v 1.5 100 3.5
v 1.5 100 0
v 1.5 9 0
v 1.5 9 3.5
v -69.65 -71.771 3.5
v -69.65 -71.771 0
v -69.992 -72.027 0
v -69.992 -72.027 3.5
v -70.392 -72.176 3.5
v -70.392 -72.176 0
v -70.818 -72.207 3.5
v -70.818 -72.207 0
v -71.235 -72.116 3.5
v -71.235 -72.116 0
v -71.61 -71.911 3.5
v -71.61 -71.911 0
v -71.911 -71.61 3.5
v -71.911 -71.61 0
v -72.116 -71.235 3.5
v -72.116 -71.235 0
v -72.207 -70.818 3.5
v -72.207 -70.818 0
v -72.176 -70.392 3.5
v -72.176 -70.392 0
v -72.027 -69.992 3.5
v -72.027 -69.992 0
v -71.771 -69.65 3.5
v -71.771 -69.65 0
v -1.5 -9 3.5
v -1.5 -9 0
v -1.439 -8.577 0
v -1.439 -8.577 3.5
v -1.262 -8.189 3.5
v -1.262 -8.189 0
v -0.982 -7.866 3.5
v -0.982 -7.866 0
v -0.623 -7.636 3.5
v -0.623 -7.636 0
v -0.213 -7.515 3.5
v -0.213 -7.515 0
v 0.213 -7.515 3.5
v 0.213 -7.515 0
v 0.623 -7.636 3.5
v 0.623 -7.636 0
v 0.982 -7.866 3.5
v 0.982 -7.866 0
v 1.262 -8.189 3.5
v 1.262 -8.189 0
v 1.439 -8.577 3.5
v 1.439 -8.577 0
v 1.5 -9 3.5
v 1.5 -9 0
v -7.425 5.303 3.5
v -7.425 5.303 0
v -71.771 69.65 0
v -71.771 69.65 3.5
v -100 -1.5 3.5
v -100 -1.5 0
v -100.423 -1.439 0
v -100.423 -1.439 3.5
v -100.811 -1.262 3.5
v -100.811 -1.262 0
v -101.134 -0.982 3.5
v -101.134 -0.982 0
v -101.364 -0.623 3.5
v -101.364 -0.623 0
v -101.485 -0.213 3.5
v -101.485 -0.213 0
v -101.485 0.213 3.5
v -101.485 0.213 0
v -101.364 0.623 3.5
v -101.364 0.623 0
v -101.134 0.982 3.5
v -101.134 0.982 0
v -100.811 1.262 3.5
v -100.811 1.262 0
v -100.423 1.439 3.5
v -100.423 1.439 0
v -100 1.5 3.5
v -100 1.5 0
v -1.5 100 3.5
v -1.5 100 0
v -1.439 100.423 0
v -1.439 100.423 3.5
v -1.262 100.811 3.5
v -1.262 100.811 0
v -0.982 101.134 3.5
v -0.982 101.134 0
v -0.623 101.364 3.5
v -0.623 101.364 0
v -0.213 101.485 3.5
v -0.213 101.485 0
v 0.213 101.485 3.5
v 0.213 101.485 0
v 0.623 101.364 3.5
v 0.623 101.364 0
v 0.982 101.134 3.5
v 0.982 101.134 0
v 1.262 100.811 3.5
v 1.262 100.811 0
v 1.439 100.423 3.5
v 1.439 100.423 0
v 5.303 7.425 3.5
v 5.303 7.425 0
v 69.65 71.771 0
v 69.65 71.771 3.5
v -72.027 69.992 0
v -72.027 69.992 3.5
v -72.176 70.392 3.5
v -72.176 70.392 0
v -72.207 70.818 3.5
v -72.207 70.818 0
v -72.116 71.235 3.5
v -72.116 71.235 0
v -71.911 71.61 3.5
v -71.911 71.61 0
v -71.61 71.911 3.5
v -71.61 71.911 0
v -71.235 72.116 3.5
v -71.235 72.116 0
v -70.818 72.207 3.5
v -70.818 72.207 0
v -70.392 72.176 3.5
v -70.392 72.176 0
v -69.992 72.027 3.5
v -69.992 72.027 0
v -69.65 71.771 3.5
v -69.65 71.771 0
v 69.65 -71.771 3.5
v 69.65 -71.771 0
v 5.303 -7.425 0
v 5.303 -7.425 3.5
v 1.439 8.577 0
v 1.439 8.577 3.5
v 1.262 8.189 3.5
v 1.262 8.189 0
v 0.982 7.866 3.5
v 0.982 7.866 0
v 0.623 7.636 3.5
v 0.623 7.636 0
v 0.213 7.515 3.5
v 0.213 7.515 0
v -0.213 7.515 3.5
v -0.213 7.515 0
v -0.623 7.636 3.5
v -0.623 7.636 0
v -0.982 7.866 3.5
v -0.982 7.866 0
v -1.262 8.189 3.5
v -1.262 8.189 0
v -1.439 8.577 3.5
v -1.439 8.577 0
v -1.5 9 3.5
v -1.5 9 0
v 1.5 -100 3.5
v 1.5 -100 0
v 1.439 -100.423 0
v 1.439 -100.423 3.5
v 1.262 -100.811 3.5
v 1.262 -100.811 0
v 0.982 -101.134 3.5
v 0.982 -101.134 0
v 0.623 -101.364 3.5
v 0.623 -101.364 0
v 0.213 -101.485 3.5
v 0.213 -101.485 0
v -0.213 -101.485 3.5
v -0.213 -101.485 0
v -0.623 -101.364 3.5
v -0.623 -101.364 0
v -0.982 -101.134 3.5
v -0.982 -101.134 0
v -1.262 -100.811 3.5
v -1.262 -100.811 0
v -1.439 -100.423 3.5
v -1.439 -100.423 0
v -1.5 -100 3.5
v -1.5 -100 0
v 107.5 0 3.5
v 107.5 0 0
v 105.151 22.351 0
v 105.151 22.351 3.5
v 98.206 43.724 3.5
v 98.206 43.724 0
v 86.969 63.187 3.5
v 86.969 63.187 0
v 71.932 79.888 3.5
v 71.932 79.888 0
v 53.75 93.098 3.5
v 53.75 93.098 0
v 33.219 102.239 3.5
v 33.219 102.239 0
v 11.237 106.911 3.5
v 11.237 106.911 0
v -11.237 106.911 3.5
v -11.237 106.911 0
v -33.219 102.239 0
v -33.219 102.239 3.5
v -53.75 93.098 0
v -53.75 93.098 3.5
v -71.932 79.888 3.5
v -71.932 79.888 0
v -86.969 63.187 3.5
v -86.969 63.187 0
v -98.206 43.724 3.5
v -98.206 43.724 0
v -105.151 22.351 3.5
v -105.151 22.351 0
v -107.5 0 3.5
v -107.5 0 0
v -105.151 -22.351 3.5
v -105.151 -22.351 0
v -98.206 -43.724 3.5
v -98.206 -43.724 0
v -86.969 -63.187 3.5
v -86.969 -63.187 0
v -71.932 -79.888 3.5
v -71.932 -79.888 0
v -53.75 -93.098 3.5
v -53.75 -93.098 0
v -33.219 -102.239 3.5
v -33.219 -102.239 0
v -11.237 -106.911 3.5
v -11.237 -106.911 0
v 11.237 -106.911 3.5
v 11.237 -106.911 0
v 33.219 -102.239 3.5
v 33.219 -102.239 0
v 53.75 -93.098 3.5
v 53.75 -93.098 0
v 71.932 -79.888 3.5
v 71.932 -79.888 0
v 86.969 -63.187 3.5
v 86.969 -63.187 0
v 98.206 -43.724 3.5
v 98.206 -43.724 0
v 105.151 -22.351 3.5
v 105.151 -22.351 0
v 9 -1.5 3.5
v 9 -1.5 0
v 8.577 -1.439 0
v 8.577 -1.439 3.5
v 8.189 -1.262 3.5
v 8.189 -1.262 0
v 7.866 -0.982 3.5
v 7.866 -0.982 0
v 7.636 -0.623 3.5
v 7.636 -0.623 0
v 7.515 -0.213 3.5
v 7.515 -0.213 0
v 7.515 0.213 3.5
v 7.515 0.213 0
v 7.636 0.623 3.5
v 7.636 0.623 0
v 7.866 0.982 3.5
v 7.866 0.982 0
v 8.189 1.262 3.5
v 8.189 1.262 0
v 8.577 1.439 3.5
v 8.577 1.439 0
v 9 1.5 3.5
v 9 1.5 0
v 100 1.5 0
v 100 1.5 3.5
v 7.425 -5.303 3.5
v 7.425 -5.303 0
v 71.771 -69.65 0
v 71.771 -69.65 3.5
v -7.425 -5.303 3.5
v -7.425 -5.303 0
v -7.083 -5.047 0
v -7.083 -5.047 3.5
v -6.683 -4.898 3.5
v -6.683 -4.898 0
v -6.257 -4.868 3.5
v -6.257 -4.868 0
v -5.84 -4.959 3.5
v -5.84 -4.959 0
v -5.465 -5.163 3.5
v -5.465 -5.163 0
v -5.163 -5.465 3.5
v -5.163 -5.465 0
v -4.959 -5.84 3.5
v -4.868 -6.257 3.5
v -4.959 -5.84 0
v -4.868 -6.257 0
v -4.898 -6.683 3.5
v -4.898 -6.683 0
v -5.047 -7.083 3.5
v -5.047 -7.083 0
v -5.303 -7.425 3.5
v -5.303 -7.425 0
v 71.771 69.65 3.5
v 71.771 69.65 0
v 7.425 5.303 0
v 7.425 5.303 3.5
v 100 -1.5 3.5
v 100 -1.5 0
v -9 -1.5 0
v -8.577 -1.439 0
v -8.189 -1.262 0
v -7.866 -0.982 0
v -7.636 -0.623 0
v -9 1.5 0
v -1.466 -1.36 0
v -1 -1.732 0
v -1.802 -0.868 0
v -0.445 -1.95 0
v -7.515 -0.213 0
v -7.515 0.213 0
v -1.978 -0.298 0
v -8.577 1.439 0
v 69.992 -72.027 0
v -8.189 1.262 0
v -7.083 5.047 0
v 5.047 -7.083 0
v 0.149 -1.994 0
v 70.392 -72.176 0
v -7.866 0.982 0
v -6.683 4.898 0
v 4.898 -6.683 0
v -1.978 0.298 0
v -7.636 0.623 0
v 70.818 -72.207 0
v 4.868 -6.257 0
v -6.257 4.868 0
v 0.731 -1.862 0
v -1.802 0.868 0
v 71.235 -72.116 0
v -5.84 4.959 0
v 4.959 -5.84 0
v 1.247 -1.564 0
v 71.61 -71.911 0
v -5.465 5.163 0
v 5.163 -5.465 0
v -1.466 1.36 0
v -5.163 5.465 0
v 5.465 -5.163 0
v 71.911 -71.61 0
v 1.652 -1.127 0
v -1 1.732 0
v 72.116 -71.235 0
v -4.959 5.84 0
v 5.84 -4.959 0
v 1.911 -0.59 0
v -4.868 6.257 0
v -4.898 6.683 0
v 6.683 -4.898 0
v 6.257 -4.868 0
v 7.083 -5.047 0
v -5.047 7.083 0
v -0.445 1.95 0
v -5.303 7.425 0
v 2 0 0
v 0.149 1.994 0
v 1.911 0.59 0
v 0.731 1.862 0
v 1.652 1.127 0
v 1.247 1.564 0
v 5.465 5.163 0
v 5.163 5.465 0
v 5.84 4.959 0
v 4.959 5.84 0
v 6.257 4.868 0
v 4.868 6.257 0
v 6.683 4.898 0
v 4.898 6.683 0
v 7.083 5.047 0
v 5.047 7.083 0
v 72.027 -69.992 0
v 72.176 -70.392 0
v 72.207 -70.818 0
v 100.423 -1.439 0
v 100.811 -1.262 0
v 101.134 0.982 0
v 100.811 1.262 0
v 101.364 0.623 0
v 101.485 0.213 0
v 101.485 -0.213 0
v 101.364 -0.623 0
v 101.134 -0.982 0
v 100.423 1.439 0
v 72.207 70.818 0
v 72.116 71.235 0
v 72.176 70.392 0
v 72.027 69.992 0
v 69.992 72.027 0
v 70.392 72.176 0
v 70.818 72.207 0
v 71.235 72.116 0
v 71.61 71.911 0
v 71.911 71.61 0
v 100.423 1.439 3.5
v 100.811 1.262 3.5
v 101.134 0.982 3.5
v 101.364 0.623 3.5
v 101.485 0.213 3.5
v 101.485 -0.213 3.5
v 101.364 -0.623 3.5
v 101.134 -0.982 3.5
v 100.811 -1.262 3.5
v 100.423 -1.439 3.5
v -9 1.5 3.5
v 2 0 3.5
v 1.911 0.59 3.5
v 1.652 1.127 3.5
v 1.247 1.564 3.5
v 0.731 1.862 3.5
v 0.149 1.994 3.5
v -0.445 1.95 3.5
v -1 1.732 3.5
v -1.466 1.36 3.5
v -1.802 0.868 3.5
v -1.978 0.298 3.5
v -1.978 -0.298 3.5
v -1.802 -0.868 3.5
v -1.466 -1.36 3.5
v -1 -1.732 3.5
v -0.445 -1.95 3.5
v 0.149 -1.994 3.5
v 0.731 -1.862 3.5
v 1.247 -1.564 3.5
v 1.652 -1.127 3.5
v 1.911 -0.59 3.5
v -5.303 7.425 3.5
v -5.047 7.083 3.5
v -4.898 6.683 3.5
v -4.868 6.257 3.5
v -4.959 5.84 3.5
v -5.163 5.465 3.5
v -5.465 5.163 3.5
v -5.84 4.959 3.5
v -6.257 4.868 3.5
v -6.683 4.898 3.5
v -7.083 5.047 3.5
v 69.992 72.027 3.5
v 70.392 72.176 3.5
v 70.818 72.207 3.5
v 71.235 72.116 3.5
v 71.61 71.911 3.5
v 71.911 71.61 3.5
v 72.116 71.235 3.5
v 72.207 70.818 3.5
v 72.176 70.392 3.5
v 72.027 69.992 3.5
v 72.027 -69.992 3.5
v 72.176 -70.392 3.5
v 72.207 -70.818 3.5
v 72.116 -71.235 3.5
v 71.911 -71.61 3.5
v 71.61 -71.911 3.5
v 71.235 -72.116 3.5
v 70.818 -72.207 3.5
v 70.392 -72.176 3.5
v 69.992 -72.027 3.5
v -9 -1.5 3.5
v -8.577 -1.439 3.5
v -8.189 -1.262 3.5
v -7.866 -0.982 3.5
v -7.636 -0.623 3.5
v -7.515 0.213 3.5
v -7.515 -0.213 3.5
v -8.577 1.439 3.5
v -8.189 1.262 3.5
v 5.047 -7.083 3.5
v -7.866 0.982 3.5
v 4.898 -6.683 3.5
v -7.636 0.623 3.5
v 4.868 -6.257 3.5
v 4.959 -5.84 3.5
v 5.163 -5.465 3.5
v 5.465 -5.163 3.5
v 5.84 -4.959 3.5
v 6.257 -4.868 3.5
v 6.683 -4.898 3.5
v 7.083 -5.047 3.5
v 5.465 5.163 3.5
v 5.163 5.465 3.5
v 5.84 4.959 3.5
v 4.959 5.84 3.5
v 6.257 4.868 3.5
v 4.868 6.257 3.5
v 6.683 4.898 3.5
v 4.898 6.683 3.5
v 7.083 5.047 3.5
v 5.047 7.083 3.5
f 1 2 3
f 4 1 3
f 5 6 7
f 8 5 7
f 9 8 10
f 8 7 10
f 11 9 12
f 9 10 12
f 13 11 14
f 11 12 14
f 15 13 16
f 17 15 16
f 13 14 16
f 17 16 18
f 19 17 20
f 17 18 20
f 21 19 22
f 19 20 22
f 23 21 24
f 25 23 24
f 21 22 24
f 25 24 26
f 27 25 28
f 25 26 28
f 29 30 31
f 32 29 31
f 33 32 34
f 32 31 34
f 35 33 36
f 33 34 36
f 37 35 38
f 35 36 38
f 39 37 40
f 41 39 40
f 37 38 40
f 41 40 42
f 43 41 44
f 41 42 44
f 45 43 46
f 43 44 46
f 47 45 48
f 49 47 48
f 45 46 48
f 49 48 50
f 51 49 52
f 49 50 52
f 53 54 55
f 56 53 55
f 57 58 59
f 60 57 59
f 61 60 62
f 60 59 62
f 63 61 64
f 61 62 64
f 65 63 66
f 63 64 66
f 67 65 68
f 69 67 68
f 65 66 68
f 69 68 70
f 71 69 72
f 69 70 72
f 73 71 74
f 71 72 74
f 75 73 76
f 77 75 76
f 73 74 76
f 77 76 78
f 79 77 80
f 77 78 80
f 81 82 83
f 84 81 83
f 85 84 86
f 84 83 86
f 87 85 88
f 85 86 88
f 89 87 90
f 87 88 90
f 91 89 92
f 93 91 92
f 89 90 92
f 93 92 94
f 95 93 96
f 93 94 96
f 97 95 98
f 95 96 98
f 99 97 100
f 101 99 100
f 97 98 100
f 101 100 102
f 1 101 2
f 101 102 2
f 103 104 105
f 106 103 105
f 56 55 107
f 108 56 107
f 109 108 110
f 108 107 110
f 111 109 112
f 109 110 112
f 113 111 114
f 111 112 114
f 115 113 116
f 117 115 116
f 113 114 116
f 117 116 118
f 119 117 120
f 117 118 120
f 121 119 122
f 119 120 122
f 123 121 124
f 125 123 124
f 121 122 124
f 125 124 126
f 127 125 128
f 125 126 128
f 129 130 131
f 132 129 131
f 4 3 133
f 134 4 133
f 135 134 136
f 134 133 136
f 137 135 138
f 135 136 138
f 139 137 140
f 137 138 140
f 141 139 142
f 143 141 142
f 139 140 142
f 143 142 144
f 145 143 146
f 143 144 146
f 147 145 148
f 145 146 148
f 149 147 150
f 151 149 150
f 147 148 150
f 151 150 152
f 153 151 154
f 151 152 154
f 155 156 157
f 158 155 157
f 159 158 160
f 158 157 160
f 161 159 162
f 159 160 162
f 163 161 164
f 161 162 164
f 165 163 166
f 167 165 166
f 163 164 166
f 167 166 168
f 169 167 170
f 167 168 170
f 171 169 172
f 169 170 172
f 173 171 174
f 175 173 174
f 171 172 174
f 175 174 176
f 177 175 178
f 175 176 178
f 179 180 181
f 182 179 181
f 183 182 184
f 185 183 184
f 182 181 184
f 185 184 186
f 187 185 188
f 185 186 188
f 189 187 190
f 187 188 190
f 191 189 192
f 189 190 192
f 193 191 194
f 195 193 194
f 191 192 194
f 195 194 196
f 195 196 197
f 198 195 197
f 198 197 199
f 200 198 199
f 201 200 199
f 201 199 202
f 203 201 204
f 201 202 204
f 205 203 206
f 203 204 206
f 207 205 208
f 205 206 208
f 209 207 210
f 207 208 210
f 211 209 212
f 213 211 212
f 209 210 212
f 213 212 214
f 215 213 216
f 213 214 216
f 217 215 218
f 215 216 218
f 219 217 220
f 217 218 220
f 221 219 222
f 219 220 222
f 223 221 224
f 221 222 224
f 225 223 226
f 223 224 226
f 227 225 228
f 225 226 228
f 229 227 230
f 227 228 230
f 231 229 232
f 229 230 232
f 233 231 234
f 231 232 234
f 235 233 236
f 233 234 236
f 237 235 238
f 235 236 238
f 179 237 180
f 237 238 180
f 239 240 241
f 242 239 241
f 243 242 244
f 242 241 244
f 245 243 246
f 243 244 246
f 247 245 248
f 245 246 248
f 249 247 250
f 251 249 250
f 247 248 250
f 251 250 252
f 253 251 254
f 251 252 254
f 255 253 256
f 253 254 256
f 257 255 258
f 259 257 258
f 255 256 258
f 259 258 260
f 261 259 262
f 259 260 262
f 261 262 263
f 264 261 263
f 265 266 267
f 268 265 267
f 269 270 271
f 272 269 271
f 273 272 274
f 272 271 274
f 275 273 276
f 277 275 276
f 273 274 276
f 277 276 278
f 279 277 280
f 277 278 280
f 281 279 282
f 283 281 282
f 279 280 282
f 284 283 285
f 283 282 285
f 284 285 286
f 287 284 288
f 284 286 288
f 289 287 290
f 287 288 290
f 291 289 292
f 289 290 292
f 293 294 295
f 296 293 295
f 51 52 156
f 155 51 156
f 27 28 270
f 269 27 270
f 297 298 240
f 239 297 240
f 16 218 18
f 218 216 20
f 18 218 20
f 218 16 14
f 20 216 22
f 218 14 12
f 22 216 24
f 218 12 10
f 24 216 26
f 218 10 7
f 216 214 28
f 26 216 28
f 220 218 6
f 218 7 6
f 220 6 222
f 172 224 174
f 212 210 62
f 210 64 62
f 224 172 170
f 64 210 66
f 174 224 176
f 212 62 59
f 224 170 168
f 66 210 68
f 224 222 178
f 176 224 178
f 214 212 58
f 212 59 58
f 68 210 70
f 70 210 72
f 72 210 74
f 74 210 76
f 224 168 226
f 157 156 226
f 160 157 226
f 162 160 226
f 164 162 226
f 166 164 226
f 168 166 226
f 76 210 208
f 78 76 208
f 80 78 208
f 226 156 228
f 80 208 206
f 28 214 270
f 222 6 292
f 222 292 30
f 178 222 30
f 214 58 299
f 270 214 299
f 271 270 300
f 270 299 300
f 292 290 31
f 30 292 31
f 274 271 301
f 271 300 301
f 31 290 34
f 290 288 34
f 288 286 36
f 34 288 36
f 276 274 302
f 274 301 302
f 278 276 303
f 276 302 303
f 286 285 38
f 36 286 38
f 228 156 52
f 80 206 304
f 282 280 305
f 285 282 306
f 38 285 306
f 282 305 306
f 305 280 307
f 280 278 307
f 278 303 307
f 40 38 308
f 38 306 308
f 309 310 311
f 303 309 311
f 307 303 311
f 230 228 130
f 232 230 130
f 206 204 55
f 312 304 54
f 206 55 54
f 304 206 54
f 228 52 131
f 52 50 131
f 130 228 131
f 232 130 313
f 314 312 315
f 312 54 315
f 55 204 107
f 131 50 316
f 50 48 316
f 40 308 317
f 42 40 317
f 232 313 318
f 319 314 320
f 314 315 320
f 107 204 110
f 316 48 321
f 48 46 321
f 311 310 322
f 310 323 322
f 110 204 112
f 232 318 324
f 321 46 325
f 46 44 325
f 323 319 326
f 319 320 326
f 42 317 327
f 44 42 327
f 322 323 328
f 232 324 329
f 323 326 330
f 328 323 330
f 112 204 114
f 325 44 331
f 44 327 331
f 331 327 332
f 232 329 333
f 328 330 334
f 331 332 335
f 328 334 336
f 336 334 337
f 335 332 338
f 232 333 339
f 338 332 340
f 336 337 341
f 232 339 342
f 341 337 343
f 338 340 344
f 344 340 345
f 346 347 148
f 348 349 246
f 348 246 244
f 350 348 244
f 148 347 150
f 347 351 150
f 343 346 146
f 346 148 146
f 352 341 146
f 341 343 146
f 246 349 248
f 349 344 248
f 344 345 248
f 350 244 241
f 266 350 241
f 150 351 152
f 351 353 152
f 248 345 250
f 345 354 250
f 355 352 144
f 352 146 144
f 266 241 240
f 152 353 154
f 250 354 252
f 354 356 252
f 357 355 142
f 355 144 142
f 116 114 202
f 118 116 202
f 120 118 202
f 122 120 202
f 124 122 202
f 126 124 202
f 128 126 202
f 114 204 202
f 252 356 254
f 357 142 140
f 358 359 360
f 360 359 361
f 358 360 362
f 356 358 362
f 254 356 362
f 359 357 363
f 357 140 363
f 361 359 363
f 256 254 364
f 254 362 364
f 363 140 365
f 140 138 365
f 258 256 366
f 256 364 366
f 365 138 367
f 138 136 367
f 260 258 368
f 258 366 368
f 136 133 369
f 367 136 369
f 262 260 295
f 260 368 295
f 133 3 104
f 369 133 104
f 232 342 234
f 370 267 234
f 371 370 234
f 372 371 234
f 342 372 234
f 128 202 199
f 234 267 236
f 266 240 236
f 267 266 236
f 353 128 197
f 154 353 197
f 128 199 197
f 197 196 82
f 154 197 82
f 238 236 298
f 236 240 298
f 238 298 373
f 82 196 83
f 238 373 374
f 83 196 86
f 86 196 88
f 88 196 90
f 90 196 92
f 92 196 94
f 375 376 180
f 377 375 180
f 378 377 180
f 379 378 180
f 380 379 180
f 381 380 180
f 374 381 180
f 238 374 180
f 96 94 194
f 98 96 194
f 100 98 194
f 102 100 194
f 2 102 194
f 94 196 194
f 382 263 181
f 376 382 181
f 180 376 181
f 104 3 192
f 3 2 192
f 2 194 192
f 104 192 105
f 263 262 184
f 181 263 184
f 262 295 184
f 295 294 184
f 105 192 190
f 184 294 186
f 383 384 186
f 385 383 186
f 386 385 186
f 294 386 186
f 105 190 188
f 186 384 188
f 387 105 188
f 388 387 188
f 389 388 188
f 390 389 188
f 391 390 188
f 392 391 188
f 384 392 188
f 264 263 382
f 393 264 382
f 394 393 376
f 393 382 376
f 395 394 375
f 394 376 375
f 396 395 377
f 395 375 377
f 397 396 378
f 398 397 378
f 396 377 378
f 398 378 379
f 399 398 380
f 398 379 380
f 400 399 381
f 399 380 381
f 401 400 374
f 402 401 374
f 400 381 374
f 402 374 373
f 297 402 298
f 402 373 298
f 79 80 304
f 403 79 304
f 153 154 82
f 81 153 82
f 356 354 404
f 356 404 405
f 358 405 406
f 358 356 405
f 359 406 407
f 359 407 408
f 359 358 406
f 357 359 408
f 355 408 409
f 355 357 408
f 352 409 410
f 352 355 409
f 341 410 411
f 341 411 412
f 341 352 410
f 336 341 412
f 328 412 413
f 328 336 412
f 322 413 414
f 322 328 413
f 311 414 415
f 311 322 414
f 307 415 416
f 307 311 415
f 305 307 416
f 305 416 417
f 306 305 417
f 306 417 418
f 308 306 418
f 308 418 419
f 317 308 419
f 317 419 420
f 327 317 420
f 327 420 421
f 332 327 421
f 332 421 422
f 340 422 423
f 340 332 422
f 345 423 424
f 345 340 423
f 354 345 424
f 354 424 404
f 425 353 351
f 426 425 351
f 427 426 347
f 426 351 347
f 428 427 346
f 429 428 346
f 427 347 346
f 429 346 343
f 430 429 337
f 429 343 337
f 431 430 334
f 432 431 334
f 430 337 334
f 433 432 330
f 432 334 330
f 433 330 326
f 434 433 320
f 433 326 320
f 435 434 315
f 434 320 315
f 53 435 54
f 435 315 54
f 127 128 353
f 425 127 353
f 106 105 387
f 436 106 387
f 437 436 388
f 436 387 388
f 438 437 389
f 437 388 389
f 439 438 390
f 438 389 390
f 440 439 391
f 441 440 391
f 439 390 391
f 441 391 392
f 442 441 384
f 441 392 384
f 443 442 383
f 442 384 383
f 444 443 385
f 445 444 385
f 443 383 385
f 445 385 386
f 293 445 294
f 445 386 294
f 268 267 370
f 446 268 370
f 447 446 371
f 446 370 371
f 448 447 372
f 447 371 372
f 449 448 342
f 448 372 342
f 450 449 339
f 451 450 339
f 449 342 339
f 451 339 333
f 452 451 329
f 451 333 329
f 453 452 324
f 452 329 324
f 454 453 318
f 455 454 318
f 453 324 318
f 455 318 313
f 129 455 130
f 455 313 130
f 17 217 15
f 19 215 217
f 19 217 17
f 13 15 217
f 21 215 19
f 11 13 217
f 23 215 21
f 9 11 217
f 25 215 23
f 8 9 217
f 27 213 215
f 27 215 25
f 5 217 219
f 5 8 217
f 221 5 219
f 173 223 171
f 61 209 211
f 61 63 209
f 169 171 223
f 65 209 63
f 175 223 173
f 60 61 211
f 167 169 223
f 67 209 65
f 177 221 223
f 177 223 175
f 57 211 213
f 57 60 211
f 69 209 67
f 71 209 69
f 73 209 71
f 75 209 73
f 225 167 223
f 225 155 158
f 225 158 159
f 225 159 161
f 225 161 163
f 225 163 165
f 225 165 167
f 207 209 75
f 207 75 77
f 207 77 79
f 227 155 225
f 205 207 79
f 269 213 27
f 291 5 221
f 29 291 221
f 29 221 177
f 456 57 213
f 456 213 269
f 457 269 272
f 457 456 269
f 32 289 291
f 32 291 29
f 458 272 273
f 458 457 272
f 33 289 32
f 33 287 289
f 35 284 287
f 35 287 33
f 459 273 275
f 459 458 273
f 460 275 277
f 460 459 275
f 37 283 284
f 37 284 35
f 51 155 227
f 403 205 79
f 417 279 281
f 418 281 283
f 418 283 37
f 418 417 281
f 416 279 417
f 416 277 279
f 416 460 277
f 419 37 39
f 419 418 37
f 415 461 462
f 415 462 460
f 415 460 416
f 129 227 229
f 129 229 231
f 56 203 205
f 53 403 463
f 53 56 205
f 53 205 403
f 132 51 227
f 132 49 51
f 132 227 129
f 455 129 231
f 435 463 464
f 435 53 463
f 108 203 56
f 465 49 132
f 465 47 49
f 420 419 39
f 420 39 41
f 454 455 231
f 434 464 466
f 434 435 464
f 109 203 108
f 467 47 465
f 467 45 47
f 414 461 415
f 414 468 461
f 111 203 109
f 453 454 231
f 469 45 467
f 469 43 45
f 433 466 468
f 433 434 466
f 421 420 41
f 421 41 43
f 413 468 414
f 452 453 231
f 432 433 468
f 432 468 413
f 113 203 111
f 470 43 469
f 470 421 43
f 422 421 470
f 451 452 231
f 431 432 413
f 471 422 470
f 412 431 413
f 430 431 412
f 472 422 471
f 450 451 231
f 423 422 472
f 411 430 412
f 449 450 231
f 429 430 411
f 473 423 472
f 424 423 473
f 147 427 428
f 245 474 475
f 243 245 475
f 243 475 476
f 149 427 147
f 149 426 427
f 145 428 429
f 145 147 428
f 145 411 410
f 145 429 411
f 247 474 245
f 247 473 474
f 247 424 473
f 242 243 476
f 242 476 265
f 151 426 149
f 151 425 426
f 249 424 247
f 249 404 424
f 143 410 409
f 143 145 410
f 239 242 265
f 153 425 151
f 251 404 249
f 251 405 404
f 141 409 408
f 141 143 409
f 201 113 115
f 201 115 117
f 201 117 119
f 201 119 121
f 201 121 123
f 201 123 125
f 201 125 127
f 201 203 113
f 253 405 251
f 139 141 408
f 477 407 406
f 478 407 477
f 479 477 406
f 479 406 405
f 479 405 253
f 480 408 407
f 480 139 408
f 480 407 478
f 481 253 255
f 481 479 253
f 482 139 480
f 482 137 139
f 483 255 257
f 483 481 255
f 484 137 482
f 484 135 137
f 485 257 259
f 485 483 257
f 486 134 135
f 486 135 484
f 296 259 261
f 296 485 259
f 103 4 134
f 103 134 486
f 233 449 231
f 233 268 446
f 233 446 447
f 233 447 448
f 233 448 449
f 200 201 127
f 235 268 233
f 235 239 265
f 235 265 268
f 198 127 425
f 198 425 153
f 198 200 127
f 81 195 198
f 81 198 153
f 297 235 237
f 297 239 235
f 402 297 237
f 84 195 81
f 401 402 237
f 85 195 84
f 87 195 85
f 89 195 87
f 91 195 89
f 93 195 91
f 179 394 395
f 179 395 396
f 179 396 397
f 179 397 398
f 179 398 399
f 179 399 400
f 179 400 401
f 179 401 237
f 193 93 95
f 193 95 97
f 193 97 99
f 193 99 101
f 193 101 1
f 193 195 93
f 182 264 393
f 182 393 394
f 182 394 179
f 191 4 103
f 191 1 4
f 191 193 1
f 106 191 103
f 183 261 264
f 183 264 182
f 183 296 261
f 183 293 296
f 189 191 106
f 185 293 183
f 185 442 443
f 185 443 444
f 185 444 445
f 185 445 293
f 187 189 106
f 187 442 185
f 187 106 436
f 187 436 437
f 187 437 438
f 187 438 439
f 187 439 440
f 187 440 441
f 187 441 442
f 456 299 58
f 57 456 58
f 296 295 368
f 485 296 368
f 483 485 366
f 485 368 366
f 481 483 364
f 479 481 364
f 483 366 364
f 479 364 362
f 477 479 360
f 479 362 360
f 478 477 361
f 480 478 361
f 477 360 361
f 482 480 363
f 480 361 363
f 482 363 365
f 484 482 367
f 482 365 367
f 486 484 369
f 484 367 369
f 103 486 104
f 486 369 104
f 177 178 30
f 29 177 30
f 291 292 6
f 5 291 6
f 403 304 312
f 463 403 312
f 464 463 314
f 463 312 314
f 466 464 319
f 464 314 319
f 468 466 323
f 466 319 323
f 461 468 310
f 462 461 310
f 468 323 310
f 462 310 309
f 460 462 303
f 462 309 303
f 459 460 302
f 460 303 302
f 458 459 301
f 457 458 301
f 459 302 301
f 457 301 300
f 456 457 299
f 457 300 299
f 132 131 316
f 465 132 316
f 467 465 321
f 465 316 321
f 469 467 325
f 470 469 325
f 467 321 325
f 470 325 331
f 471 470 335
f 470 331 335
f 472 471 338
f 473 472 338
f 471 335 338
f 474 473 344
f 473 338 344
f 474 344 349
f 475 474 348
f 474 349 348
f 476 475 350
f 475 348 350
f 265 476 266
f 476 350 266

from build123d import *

# Parameters (mm, degrees)
SKETCH1_R           = 107.5
SKETCH1_R_2         = 2
BOSS_EXTRUDE1_DEPTH = 3.5


with BuildPart() as part:
    # Sketch1 → Boss-Extrude1 (new body)
    with BuildSketch(Plane.XY):
        Circle(SKETCH1_R)
        Circle(SKETCH1_R_2, mode=Mode.SUBTRACT)
        with BuildLine():
            Line((9, 1.5), (100, 1.5))
            ThreePointArc((100, 1.5), (101.5, 0), (100, -1.5))
            Line((100, -1.5), (9, -1.5))
            ThreePointArc((9, -1.5), (7.5, 0), (9, 1.5))
        make_face(mode=Mode.SUBTRACT)
        with BuildLine():
            Line((7.424621202, -5.303300859), (71.77133829, -69.650017947))
            ThreePointArc((71.77133829, -69.650017947), (71.77133829, -71.77133829), (69.650017947, -71.77133829))
            Line((69.650017947, -71.77133829), (5.303300859, -7.424621202))
            ThreePointArc((5.303300859, -7.424621202), (5.303300859, -5.303300859), (7.424621202, -5.303300859))
        make_face(mode=Mode.SUBTRACT)
        with BuildLine():
            Line((1.5, -9), (1.5, -100))
            ThreePointArc((1.5, -100), (0, -101.5), (-1.5, -100))
            Line((-1.5, -100), (-1.5, -9))
            ThreePointArc((-1.5, -9), (0, -7.5), (1.5, -9))
        make_face(mode=Mode.SUBTRACT)
        with BuildLine():
            Line((-5.303300859, -7.424621202), (-69.650017947, -71.77133829))
            ThreePointArc((-69.650017947, -71.77133829), (-71.77133829, -71.77133829), (-71.77133829, -69.650017947))
            Line((-71.77133829, -69.650017947), (-7.424621202, -5.303300859))
            ThreePointArc((-7.424621202, -5.303300859), (-5.303300859, -5.303300859), (-5.303300859, -7.424621202))
        make_face(mode=Mode.SUBTRACT)
        with BuildLine():
            Line((-9, -1.5), (-100, -1.5))
            ThreePointArc((-100, -1.5), (-101.5, 0), (-100, 1.5))
            Line((-100, 1.5), (-9, 1.5))
            ThreePointArc((-9, 1.5), (-7.5, 0), (-9, -1.5))
        make_face(mode=Mode.SUBTRACT)
        with BuildLine():
            Line((-7.424621202, 5.303300859), (-71.77133829, 69.650017947))
            ThreePointArc((-71.77133829, 69.650017947), (-71.77133829, 71.77133829), (-69.650017947, 71.77133829))
            Line((-69.650017947, 71.77133829), (-5.303300859, 7.424621202))
            ThreePointArc((-5.303300859, 7.424621202), (-5.303300859, 5.303300859), (-7.424621202, 5.303300859))
        make_face(mode=Mode.SUBTRACT)
        with BuildLine():
            Line((-1.5, 9), (-1.5, 100))
            ThreePointArc((-1.5, 100), (0, 101.5), (1.5, 100))
            Line((1.5, 100), (1.5, 9))
            ThreePointArc((1.5, 9), (0, 7.5), (-1.5, 9))
        make_face(mode=Mode.SUBTRACT)
        with BuildLine():
            Line((5.303300859, 7.424621202), (69.650017947, 71.77133829))
            ThreePointArc((69.650017947, 71.77133829), (71.77133829, 71.77133829), (71.77133829, 69.650017947))
            Line((71.77133829, 69.650017947), (7.424621202, 5.303300859))
            ThreePointArc((7.424621202, 5.303300859), (5.303300859, 5.303300859), (5.303300859, 7.424621202))
        make_face(mode=Mode.SUBTRACT)
    extrude(amount=BOSS_EXTRUDE1_DEPTH)


solid = part.part
